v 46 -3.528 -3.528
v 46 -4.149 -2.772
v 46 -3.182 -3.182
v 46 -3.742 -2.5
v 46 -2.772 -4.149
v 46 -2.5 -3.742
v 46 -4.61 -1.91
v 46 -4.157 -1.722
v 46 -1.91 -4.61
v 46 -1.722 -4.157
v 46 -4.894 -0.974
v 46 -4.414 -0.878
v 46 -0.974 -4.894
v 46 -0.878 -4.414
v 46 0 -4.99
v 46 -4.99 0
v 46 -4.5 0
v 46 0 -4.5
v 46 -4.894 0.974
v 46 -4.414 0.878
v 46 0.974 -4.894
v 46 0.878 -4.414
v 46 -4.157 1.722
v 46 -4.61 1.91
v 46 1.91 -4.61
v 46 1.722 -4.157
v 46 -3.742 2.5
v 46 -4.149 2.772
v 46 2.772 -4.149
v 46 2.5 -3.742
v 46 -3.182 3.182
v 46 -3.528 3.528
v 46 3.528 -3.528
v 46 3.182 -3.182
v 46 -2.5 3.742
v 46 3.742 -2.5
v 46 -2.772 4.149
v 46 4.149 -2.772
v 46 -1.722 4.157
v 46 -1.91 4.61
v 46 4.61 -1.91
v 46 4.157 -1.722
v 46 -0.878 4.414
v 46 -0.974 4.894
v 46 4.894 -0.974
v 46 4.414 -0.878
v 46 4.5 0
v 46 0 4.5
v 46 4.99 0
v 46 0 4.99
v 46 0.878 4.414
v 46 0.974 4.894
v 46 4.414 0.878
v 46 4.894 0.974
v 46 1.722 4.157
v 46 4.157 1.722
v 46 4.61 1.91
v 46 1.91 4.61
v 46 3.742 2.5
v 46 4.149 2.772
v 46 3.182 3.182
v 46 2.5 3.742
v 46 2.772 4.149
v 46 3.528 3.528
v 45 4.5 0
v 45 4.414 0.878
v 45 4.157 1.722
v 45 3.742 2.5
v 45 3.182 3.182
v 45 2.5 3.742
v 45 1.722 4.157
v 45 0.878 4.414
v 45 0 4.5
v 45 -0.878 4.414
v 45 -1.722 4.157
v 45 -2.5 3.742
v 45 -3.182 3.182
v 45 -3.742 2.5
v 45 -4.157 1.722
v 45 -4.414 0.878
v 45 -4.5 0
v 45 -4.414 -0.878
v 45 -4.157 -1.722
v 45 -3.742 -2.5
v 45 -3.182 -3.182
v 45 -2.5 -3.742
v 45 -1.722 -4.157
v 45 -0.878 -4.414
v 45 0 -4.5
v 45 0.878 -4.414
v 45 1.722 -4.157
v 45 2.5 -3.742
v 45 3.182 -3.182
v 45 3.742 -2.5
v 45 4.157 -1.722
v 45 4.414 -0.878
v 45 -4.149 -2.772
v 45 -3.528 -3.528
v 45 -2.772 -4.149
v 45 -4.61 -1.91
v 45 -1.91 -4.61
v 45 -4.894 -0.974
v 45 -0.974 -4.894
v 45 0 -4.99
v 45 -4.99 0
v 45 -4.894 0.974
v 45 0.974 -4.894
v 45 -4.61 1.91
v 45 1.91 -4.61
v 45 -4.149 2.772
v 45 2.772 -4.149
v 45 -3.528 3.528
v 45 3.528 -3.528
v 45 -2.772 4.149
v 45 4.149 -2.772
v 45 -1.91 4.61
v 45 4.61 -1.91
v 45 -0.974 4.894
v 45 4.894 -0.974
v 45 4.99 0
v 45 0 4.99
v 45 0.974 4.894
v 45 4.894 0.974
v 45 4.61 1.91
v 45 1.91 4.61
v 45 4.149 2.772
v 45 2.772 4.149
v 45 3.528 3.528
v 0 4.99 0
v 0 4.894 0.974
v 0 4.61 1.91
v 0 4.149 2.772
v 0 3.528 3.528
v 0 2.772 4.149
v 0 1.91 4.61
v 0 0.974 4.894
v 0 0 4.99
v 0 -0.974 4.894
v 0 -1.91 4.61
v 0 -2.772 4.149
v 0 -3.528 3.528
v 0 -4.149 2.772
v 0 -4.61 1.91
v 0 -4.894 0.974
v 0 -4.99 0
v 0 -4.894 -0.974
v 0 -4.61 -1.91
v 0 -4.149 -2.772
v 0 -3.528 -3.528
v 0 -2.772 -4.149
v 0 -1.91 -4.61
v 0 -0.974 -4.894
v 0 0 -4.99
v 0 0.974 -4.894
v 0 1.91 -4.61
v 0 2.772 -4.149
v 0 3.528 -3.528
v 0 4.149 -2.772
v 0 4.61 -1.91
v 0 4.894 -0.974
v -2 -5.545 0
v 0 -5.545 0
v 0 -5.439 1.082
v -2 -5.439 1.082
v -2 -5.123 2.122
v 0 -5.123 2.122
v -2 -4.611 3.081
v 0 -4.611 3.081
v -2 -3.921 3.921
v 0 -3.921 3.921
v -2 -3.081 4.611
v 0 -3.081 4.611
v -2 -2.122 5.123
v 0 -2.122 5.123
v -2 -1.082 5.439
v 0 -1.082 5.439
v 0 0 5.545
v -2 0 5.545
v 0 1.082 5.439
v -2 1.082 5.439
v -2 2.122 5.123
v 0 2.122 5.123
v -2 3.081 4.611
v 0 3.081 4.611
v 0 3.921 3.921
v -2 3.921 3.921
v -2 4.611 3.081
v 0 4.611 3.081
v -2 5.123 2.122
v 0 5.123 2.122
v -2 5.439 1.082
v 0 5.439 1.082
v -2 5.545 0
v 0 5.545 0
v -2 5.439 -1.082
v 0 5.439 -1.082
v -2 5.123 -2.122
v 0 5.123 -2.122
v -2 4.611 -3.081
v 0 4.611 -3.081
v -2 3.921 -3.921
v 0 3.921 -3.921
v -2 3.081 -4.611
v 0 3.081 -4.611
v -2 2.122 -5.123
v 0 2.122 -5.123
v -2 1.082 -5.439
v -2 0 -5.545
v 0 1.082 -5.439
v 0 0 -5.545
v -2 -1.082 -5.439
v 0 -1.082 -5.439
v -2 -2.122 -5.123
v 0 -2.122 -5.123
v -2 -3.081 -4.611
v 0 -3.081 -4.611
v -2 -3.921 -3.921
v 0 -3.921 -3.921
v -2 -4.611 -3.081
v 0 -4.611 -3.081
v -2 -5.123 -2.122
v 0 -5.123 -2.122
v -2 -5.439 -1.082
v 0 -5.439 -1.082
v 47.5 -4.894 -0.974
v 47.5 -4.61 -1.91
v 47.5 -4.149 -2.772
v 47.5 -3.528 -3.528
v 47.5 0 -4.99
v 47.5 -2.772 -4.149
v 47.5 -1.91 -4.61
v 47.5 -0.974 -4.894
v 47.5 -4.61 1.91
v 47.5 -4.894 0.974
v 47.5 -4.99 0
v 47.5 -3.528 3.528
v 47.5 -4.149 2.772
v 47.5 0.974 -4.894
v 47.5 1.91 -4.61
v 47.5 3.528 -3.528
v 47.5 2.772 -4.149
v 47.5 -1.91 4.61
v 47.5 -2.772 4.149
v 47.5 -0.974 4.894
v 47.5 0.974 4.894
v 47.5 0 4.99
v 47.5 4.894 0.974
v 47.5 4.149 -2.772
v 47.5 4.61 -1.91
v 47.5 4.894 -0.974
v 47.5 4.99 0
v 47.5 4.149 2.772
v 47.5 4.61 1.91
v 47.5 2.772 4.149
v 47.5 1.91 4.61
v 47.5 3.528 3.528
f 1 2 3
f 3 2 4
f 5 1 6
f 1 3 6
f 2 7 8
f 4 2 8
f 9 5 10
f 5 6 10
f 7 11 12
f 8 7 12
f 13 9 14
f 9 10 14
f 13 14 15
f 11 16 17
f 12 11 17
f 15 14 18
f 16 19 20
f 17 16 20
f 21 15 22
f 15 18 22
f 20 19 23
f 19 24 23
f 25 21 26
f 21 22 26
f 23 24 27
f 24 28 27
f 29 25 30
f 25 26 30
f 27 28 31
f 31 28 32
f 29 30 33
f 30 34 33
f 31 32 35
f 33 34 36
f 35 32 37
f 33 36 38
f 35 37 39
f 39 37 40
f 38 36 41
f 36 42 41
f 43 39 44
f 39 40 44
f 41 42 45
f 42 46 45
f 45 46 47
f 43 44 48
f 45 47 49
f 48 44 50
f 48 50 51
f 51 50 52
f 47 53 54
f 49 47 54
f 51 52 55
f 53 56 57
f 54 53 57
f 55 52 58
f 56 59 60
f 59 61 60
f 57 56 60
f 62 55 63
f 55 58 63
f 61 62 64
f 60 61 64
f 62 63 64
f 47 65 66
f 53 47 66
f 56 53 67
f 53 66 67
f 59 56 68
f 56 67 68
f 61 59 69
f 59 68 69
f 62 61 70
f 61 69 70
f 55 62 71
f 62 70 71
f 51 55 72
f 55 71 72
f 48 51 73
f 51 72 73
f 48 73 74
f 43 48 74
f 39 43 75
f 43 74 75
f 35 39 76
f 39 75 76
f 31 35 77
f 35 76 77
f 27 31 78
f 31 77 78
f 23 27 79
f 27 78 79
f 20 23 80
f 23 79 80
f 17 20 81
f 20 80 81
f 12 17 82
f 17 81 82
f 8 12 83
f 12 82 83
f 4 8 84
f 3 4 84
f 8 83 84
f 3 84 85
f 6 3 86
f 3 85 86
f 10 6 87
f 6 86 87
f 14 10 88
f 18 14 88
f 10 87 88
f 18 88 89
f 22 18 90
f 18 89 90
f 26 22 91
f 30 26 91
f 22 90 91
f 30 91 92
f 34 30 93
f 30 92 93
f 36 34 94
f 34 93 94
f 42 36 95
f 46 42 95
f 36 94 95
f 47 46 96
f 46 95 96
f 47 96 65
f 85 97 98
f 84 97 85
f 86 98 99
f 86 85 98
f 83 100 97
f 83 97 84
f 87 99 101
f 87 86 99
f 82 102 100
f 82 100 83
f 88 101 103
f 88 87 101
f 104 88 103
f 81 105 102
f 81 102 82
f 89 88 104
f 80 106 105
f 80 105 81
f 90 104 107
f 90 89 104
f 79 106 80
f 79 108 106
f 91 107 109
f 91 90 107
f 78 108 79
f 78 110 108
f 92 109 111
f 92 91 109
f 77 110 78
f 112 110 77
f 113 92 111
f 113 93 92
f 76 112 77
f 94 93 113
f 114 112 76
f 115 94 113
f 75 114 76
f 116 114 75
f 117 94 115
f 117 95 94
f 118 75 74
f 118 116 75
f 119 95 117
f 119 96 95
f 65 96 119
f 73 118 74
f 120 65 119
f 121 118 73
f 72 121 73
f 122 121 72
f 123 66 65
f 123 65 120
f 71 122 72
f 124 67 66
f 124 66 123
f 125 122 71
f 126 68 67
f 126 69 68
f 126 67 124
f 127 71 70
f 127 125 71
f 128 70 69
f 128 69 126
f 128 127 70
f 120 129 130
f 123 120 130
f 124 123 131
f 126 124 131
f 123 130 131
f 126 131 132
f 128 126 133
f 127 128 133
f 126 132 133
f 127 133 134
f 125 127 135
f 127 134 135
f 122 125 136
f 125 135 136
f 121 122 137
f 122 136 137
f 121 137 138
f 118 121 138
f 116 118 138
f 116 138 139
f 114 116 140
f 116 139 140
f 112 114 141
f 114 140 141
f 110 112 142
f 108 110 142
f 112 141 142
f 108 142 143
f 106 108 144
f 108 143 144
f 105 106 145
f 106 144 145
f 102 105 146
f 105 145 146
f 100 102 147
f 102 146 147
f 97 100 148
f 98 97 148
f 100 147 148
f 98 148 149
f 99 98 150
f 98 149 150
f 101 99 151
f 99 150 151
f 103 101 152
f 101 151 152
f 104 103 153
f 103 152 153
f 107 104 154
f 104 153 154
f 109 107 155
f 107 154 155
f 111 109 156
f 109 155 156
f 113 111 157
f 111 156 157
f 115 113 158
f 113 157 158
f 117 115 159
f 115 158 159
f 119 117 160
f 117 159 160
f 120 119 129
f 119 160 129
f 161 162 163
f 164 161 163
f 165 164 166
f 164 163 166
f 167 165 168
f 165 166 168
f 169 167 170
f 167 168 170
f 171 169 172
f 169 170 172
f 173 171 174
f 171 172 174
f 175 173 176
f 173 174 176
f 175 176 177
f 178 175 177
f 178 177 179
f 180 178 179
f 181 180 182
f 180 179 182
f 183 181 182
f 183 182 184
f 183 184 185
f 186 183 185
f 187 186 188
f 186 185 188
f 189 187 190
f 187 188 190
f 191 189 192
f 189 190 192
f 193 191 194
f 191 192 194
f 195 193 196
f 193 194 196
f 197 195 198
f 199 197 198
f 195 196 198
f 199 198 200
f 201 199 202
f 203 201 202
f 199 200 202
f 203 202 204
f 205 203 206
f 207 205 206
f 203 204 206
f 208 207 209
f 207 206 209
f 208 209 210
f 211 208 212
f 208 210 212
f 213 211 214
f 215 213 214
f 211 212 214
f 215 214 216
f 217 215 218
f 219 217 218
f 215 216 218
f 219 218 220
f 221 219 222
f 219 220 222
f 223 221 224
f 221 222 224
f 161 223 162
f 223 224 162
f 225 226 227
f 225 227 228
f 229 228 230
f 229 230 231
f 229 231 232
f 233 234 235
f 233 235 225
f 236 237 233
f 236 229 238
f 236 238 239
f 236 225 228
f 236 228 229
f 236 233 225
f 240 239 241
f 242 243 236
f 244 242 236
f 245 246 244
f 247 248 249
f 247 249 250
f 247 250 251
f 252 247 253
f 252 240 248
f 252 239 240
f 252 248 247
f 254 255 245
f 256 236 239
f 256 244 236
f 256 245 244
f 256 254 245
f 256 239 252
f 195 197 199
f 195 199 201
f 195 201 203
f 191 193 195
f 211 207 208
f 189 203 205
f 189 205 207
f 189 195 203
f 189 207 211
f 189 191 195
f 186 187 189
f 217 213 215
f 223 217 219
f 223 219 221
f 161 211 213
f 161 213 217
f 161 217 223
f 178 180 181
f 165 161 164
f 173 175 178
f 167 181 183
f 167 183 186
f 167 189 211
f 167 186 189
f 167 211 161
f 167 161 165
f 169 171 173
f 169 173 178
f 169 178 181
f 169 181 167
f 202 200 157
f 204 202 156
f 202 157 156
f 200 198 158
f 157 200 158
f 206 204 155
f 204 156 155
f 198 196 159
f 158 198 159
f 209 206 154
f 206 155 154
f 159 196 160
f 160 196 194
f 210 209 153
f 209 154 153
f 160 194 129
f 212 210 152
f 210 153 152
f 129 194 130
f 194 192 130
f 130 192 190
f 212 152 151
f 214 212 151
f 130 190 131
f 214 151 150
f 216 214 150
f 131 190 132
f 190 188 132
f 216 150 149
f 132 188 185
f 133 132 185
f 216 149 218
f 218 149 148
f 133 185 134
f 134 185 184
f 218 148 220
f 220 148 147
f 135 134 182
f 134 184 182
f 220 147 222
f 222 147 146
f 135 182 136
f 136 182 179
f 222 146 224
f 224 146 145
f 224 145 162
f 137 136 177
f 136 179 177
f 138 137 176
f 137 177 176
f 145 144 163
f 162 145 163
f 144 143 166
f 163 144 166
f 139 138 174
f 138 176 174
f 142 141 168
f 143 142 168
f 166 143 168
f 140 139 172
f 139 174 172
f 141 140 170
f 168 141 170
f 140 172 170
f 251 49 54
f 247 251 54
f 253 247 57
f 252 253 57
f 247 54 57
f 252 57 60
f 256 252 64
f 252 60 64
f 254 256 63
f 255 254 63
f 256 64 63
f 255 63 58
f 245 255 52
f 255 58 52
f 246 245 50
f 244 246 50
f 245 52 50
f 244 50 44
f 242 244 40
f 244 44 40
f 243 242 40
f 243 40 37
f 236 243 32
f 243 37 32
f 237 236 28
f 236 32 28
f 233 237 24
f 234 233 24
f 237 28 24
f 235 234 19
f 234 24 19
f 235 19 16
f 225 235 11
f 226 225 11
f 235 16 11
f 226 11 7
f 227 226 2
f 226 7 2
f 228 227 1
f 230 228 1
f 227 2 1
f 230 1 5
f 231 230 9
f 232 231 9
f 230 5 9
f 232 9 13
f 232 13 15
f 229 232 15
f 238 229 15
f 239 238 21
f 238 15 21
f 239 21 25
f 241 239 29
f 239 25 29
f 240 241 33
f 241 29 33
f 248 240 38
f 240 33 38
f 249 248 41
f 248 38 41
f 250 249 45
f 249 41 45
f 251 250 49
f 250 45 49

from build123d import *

# Parameters (mm, degrees)
F0_R     = 4.99
F1_DEPTH = 45
F2_R     = 5.5454073787
F2_R_2   = 4.99
F3_DEPTH = 2
F4_R     = 4.5
F5_DEPTH = 1
F6_R     = 4.99
F6_R_2   = 4.5
F7_DEPTH = 1.5


with BuildPart() as f1:
    # F0 (on Right) → F1 (new body)
    with BuildSketch(Plane.YZ):
        Circle(F0_R)
    extrude(amount=F1_DEPTH)

    # F2 (on face) → F3 (join)
    with BuildSketch(Plane(origin=(0, 0, 0), x_dir=(0, -1, 0), z_dir=(-1, 0, 0))):
        Circle(F2_R)
        Circle(F2_R_2, mode=Mode.SUBTRACT)
        Circle(F2_R_2)
    extrude(amount=F3_DEPTH)

    # F4 (on face) → F5 (join)
    with BuildSketch(Plane.YZ.offset(45)):
        Circle(F4_R)
    extrude(amount=F5_DEPTH)

    # F6 (on face) → F7 (join)
    with BuildSketch(Plane.YZ.offset(46)):
        Circle(F6_R)
        Circle(F6_R_2, mode=Mode.SUBTRACT)
        Circle(F6_R_2)
    extrude(amount=F7_DEPTH)


solid = f1.part
